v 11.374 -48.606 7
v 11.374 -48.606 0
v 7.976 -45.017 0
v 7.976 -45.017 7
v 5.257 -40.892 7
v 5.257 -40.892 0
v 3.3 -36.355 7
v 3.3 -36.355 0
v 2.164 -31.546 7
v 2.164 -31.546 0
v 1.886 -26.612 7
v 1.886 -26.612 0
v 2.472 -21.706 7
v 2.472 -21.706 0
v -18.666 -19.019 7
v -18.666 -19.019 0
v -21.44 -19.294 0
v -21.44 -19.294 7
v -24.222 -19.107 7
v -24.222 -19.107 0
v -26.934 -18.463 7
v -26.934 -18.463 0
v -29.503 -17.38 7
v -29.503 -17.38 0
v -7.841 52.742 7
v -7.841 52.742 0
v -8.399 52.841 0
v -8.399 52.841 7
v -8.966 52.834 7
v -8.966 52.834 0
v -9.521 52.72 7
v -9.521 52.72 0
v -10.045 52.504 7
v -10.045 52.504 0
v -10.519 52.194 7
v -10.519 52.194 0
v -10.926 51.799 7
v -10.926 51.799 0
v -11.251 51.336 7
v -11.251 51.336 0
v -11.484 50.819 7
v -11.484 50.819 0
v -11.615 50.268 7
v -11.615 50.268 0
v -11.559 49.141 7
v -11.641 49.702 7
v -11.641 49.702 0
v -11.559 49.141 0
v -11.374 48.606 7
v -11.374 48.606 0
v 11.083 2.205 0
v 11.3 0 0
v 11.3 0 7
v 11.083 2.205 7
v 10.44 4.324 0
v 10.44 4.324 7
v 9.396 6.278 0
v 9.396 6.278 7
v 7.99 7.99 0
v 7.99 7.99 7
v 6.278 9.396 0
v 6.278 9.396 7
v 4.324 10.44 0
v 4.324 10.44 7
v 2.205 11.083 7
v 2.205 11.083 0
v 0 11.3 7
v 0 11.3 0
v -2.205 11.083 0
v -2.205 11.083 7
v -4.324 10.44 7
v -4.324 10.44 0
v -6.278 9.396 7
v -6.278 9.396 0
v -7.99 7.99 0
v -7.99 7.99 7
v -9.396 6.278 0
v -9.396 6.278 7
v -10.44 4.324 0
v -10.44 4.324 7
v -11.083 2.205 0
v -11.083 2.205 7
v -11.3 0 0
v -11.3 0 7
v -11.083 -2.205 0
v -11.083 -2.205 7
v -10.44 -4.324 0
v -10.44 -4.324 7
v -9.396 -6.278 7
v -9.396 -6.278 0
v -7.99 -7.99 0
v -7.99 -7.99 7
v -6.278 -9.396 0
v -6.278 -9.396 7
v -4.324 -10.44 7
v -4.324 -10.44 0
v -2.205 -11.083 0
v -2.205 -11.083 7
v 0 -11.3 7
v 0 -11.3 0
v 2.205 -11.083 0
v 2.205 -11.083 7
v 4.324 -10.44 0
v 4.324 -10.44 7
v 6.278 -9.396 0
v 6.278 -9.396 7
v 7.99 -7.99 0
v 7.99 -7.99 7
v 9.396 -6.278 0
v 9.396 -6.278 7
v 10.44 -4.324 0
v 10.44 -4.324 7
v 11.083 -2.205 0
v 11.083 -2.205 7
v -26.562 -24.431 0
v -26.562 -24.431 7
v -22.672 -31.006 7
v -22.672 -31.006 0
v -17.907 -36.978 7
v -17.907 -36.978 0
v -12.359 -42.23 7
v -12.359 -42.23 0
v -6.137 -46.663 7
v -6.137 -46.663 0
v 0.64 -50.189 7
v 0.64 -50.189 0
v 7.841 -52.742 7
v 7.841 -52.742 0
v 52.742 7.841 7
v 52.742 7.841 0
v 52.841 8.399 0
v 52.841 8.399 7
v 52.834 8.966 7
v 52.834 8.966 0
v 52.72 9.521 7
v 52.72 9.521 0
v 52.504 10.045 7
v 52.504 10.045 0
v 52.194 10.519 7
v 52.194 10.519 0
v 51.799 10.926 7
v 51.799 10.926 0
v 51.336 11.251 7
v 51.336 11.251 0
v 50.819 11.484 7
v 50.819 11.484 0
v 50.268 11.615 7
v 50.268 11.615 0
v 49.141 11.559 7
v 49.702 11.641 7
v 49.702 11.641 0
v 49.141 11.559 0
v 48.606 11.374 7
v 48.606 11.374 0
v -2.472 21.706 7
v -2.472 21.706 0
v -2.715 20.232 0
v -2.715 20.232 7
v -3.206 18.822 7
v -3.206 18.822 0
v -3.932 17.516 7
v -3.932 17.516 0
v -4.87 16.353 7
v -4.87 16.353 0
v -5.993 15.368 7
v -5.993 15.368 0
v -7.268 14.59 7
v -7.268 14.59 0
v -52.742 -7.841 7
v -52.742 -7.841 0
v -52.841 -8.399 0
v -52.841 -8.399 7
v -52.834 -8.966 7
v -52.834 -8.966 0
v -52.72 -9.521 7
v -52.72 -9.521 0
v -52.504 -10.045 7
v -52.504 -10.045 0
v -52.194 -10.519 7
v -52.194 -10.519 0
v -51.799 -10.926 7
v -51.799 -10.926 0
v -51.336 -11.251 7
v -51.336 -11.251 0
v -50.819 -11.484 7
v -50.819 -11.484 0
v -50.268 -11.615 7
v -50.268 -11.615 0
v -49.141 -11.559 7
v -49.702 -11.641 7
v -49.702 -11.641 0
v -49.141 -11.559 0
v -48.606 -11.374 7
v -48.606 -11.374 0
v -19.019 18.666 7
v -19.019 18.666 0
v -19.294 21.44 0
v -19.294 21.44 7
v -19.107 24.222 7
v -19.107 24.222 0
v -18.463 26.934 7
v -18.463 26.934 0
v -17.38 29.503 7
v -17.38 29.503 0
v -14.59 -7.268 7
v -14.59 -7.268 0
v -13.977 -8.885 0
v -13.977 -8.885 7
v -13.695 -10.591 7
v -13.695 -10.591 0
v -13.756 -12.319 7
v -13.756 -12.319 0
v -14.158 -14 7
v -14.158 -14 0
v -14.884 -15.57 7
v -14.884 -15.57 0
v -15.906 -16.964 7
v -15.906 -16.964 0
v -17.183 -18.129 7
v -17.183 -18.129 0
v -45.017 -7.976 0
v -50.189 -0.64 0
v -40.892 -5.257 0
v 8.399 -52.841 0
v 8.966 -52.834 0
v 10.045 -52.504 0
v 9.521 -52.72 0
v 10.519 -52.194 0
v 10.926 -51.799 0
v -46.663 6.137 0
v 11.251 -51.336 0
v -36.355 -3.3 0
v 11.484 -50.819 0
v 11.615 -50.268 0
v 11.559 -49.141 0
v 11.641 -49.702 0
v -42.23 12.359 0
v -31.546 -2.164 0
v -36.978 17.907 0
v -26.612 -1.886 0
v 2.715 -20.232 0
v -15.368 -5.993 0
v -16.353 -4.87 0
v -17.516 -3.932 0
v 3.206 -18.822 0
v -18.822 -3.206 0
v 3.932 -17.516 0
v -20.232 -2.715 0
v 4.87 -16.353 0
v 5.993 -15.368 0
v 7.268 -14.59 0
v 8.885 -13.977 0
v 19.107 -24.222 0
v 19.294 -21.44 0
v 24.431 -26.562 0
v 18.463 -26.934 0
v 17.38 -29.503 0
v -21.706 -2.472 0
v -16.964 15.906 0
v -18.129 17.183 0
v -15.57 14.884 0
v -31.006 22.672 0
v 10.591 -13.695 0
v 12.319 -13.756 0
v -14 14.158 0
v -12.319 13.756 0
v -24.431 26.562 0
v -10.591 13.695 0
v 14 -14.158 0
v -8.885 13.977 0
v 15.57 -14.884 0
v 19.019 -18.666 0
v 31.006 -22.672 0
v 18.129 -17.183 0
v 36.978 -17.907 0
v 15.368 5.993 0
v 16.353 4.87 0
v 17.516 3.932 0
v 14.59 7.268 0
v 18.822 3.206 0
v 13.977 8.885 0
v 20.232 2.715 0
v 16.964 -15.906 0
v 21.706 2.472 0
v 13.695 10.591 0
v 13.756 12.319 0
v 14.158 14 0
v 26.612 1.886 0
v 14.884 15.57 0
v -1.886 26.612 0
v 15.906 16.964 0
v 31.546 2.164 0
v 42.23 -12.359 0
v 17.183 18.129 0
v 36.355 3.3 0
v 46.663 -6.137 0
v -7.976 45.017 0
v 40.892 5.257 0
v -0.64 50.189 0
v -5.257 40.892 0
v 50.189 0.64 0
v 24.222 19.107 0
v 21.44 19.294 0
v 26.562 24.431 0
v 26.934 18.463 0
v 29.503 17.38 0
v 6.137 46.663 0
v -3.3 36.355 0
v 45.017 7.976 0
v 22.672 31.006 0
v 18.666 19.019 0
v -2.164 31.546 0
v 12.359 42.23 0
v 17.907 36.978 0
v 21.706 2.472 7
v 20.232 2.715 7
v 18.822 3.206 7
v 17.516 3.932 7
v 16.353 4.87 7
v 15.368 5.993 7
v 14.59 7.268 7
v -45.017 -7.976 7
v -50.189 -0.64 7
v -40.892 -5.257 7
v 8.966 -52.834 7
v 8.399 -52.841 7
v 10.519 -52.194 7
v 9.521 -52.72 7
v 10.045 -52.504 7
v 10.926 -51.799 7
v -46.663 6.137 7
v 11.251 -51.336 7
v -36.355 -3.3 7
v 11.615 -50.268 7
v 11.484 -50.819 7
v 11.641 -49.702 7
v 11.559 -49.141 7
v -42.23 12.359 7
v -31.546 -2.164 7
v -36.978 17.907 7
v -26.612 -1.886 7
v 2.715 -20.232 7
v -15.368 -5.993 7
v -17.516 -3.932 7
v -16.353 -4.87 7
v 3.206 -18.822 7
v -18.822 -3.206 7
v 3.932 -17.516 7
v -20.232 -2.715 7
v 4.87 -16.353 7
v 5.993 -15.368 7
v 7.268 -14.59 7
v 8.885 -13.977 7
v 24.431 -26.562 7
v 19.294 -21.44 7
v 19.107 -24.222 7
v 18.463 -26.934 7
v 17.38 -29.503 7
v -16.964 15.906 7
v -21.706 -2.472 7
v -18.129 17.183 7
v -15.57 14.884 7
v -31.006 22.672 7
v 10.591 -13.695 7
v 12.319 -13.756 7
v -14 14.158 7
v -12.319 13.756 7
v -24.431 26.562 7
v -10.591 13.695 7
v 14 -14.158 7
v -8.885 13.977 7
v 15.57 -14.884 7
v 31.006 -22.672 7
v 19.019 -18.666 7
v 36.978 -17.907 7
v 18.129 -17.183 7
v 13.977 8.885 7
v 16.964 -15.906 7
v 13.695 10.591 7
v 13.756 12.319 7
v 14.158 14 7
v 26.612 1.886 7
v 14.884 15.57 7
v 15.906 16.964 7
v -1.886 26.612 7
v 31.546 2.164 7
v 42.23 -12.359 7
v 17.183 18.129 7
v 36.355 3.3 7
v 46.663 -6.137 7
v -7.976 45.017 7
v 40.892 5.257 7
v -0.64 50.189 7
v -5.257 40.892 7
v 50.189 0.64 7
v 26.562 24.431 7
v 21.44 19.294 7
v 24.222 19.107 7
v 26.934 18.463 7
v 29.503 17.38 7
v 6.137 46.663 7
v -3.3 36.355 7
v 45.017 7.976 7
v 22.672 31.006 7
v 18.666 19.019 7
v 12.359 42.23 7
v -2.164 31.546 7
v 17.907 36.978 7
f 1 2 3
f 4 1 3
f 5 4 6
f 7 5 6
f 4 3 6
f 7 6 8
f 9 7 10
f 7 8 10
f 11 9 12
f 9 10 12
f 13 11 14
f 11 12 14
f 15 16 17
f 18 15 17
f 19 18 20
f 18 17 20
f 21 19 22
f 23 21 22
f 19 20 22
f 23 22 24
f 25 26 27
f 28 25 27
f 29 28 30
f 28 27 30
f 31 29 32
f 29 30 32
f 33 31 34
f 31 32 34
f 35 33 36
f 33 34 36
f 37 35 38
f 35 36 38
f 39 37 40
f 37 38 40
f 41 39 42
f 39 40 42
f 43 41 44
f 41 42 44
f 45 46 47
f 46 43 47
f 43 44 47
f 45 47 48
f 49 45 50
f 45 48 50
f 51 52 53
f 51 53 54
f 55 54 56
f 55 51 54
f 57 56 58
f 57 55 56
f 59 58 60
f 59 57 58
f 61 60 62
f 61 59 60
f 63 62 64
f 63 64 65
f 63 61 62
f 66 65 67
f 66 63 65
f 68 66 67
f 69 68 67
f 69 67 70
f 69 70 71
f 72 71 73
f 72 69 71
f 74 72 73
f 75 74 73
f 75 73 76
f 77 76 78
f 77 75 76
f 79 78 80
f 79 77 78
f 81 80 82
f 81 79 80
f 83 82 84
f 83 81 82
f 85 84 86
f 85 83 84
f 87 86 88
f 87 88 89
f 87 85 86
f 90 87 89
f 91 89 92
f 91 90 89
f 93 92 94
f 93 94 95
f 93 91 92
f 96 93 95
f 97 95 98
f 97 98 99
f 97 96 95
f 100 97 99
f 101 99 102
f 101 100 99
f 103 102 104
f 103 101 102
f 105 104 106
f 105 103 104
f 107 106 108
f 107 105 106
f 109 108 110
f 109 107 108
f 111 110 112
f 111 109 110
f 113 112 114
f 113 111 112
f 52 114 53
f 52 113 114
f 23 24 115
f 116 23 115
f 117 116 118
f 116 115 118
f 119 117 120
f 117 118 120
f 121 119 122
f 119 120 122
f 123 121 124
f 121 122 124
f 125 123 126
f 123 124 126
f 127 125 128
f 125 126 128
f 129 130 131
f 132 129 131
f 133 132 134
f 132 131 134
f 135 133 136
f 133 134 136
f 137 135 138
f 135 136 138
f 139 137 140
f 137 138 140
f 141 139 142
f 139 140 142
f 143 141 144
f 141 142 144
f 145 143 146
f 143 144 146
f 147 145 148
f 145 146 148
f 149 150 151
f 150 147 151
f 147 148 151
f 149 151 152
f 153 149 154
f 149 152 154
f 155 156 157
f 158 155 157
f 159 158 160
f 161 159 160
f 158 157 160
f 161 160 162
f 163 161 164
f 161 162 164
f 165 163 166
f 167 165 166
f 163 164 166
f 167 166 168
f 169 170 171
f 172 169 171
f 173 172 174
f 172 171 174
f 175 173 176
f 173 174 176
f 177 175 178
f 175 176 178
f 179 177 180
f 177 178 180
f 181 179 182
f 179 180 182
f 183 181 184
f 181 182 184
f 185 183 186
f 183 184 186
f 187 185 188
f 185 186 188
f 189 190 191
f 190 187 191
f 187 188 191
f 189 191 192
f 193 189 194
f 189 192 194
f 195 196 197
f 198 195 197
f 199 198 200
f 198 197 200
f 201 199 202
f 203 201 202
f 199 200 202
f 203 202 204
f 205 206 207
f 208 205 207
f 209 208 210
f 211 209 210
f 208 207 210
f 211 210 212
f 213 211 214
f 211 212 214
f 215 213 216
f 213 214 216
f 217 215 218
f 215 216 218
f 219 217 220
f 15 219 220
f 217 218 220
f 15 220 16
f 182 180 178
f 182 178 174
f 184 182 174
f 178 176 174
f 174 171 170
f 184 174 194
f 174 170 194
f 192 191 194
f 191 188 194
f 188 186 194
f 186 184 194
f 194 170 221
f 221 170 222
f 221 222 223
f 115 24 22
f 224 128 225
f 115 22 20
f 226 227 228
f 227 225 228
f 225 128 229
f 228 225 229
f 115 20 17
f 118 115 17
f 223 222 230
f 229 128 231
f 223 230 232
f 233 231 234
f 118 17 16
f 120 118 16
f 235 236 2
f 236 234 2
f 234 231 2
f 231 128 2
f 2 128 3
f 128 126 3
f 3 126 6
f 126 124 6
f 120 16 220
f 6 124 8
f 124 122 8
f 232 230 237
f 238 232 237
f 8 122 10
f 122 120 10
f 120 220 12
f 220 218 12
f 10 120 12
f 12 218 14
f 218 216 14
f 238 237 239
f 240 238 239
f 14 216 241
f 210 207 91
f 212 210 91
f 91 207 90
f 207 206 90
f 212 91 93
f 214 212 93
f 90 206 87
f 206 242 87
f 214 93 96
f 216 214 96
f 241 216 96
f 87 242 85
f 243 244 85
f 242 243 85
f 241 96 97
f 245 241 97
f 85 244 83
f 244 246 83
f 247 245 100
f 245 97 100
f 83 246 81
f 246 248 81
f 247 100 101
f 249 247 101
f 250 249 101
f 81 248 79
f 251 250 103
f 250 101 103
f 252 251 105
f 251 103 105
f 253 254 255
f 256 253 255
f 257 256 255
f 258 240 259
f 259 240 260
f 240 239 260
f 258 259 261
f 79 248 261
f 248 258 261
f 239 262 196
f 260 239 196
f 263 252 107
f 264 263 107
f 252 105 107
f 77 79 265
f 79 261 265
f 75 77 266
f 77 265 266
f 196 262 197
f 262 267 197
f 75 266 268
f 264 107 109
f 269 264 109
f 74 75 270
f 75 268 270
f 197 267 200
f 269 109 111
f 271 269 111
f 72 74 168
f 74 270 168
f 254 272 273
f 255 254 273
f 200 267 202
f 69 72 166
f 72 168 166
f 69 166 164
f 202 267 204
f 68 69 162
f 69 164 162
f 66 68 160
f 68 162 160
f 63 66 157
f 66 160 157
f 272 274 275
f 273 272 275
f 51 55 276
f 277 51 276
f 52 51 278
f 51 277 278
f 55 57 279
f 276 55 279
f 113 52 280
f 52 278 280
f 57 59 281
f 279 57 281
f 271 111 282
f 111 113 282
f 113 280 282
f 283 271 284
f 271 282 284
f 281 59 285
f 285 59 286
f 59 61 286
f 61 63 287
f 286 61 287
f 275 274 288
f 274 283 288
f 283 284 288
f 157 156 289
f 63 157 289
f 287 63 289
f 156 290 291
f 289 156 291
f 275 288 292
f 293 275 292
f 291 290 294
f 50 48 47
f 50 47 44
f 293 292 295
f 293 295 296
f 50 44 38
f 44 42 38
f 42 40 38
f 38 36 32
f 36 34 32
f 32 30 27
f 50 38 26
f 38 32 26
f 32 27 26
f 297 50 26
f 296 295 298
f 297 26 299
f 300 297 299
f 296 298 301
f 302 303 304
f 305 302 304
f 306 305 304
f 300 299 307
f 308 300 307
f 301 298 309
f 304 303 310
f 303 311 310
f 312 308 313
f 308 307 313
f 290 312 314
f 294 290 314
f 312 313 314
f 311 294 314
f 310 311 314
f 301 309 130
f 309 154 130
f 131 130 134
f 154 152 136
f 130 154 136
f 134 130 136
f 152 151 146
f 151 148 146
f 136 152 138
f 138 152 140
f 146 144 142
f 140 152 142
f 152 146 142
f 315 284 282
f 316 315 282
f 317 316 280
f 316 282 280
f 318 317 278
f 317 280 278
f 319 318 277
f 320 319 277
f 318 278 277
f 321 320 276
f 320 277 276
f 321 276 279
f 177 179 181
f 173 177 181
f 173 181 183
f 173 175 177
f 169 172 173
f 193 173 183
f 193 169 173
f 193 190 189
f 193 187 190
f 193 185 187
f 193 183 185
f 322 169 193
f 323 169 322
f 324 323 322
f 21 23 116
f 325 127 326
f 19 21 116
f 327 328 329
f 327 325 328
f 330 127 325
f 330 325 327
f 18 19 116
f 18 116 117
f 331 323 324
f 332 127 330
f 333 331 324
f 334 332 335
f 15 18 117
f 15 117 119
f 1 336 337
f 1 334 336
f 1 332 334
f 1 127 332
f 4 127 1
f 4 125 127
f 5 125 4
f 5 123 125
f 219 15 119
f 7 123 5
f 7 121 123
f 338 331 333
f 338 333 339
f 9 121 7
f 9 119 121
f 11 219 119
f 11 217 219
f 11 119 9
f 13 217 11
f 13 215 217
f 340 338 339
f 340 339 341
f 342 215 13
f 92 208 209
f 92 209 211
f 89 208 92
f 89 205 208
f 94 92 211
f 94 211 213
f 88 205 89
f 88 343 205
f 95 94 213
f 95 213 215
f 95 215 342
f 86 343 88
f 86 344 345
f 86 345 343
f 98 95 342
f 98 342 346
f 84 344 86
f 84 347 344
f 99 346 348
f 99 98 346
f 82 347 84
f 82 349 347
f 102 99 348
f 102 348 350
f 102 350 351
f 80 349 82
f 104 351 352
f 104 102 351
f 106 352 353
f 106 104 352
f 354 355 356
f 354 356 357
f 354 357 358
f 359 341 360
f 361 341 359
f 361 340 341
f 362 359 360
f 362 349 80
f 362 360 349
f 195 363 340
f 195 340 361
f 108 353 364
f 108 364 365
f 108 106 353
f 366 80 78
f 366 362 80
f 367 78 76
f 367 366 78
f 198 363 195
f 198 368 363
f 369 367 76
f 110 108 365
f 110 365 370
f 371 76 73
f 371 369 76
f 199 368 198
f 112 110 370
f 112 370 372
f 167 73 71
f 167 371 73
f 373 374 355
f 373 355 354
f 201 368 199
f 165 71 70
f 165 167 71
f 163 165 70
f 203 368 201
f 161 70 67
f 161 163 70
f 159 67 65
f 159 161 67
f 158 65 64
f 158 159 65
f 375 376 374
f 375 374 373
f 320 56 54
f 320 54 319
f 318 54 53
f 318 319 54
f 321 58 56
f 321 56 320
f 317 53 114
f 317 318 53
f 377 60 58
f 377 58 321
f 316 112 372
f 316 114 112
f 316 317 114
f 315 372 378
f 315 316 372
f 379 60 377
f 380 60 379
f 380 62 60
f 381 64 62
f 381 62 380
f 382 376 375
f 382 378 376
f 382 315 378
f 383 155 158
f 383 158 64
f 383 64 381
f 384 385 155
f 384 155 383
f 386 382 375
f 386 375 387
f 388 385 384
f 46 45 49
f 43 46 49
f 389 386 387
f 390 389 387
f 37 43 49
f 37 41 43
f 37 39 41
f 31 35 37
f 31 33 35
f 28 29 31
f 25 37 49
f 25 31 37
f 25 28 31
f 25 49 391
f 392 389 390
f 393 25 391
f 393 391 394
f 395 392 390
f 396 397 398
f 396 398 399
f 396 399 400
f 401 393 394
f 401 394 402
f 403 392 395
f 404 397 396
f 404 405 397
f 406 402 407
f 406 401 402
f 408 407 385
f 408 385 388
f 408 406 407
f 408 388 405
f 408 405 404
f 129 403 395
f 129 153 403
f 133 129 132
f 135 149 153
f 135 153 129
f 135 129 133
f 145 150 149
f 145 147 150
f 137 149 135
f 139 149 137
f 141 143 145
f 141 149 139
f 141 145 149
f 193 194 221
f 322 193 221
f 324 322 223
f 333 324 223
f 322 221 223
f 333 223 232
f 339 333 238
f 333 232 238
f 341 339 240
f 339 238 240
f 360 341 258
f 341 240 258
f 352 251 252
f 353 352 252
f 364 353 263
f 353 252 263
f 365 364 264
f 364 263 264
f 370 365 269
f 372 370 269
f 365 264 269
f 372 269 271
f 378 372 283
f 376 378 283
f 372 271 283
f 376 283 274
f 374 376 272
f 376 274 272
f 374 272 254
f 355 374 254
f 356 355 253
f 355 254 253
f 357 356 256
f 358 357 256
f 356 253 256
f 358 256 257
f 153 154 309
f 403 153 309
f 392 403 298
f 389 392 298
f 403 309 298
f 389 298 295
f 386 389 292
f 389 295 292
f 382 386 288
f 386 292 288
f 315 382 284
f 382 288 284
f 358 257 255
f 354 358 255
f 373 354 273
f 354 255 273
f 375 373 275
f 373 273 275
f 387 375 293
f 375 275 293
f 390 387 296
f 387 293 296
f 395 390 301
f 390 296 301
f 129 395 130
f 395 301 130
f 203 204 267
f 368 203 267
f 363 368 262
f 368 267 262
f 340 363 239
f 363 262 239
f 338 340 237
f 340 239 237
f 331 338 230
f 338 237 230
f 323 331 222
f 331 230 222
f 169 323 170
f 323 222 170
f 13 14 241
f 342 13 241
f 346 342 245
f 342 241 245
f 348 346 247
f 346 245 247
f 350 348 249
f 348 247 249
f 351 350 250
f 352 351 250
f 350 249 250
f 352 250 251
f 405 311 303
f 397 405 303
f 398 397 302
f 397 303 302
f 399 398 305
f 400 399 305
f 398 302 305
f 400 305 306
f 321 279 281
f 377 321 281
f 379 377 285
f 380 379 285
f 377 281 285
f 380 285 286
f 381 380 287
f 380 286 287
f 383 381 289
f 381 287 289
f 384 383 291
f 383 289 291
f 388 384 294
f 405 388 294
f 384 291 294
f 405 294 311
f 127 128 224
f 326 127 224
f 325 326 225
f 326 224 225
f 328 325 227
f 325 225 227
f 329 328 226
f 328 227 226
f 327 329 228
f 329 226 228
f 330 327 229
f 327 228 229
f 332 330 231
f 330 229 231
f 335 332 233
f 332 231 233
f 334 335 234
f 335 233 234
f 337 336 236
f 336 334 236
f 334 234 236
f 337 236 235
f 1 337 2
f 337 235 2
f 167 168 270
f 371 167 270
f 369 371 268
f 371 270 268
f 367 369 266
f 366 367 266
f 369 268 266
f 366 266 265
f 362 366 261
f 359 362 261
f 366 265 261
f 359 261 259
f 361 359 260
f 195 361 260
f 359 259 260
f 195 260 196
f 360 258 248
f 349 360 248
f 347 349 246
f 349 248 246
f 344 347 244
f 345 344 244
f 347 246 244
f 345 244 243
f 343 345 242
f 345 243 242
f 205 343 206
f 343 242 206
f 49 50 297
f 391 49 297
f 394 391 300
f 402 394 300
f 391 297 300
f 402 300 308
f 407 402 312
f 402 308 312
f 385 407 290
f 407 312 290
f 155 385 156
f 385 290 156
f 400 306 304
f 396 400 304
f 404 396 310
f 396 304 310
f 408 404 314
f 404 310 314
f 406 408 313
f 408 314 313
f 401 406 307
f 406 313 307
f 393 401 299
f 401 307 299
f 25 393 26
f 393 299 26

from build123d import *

# Parameters (mm, degrees)
F0_R        = 11.3
F1_DEPTH    = 7
F2_T1_DEPTH = 55.4992808982


# Not quite as in the source:
# - a fillet or chamfer that OpenCascade refuses, or shapes differently, is made with other operations: its cross-section is extruded or revolved along the edge and cut away or added
# - a feature names something its author has since deleted; it is built from what else it names


with BuildPart() as f1:
    # F0 (on Top) → F1 (new body)
    with BuildSketch(Plane.XY):
        with BuildLine():
            ThreePointArc((-19.0188516855, 18.6660698042), (-19.106601179, 24.2218879742), (-17.3798078978, 29.5032704141))
            ThreePointArc((-17.3798078978, 29.5032704141), (-42.8794362662, 11.5553714496), (-54.5032704141, -17.3798078978))
            ThreePointArc((-54.5032704141, -17.3798078978), (-51.6509498036, -14.2819027835), (-48.6055213036, -11.3736190606))
            ThreePointArc((-48.6055213036, -11.3736190606), (-36.3546417903, -3.2999675651), (-21.7060170396, -2.4719034169))
            ThreePointArc((-21.7060170396, -2.4719034169), (-17.5157178103, -3.9318400494), (-14.5899419176, -7.2679842351))
            ThreePointArc((-14.5899419176, -7.2679842351), (-15.4558877949, 5.1774059597), (-7.2679841768, 14.5899419466))
            ThreePointArc((-7.2679841768, 14.5899419466), (-14.000366861, 14.1575501664), (-19.0188516855, 18.6660698042))
        make_face()
        with BuildLine():
            ThreePointArc((-2.4719034169, 21.7060170396), (-3.9318400312, 17.5157178373), (-7.2679841768, 14.5899419466))
            ThreePointArc((-7.2679841768, 14.5899419466), (5.177405829, 15.4558878387), (14.5899417947, 7.2679844819))
            ThreePointArc((14.5899417947, 7.2679844819), (14.1575502222, 14.000367022), (18.6660698042, 19.0188516855))
            ThreePointArc((18.6660698042, 19.0188516855), (24.2218879742, 19.106601179), (29.5032704141, 17.3798078978))
            ThreePointArc((29.5032704141, 17.3798078978), (11.5553714496, 42.8794362662), (-17.3798078978, 54.5032704141))
            ThreePointArc((-17.3798078978, 54.5032704141), (-14.2819027835, 51.6509498036), (-11.3736190606, 48.6055213036))
            ThreePointArc((-11.3736190606, 48.6055213036), (-3.2999675651, 36.3546417903), (-2.4719034169, 21.7060170396))
        make_face()
        with BuildLine():
            ThreePointArc((14.5899417947, 7.2679844819), (5.177405829, 15.4558878387), (-7.2679841768, 14.5899419466))
            ThreePointArc((-7.2679841768, 14.5899419466), (-15.4558877949, 5.1774059597), (-14.5899419176, -7.2679842351))
            ThreePointArc((-14.5899419176, -7.2679842351), (-5.1774060707, -15.4558877577), (7.2679839673, -14.589942051))
            ThreePointArc((7.2679839673, -14.589942051), (13.8592593357, -8.5796812684), (16.3, 0))
            ThreePointArc((16.3, 0), (15.8667269979, 3.733225733), (14.5899417947, 7.2679844819))
        make_face()
        Circle(F0_R, mode=Mode.SUBTRACT)
        with BuildLine():
            ThreePointArc((7.2679839673, -14.589942051), (-5.1774060707, -15.4558877577), (-14.5899419176, -7.2679842351))
            ThreePointArc((-14.5899419176, -7.2679842351), (-14.157550177, -14.0003668918), (-18.6660698042, -19.0188516855))
            ThreePointArc((-18.6660698042, -19.0188516855), (-24.2218879742, -19.106601179), (-29.5032704141, -17.3798078978))
            ThreePointArc((-29.5032704141, -17.3798078978), (-11.5553714496, -42.8794362662), (17.3798078978, -54.5032704141))
            ThreePointArc((17.3798078978, -54.5032704141), (14.2819027835, -51.6509498036), (11.3736190606, -48.6055213036))
            ThreePointArc((11.3736190606, -48.6055213036), (3.2999675651, -36.3546417903), (2.4719034169, -21.7060170396))
            ThreePointArc((2.4719034169, -21.7060170396), (3.9318399658, -17.5157179344), (7.2679839673, -14.589942051))
        make_face()
        with BuildLine():
            ThreePointArc((21.7060170396, 2.4719034169), (17.515717696, 3.9318401265), (14.5899417947, 7.2679844819))
            ThreePointArc((14.5899417947, 7.2679844819), (15.8667269979, 3.733225733), (16.3, 0))
            ThreePointArc((16.3, 0), (13.8592593357, -8.5796812684), (7.2679839673, -14.589942051))
            ThreePointArc((7.2679839673, -14.589942051), (14.0003667504, -14.157550128), (19.0188516855, -18.6660698042))
            ThreePointArc((19.0188516855, -18.6660698042), (19.106601179, -24.2218879742), (17.3798078978, -29.5032704141))
            ThreePointArc((17.3798078978, -29.5032704141), (42.8794362662, -11.5553714496), (54.5032704141, 17.3798078978))
            ThreePointArc((54.5032704141, 17.3798078978), (51.6509498036, 14.2819027835), (48.6055213036, 11.3736190606))
            ThreePointArc((48.6055213036, 11.3736190606), (36.3546417903, 3.2999675651), (21.7060170396, 2.4719034169))
        make_face()
    extrude(amount=F1_DEPTH)

    # F2: fillet of radius 3 on 4 edges, made by hand

    # F2_s2 → F2_t1 (cut)
    with BuildSketch(Plane.XY.offset(-24.2496404491)):
        with BuildLine():
            ThreePointArc((-52.7416075724, -7.8412674467), (-51.7993975119, -10.9256989731), (-48.6055213036, -11.3736190606))
            ThreePointArc((-48.6055213036, -11.3736190606), (-51.6509498036, -14.2819027835), (-54.5032704141, -17.3798078978))
            ThreePointArc((-54.5032704141, -17.3798078978), (-53.8333652751, -12.5715819227), (-52.7416075724, -7.8412674467))
        make_face()
        with BuildLine():
            ThreePointArc((7.8412674467, -52.7416075724), (10.9256989731, -51.7993975119), (11.3736190606, -48.6055213036))
            ThreePointArc((11.3736190606, -48.6055213036), (14.2819027835, -51.6509498036), (17.3798078978, -54.5032704141))
            ThreePointArc((17.3798078978, -54.5032704141), (12.5715819227, -53.8333652751), (7.8412674467, -52.7416075724))
        make_face()
        with BuildLine():
            ThreePointArc((52.7416075724, 7.8412674467), (51.7993975119, 10.9256989731), (48.6055213036, 11.3736190606))
            ThreePointArc((48.6055213036, 11.3736190606), (51.6509498036, 14.2819027835), (54.5032704141, 17.3798078978))
            ThreePointArc((54.5032704141, 17.3798078978), (53.8333652751, 12.5715819227), (52.7416075724, 7.8412674467))
        make_face()
        with BuildLine():
            ThreePointArc((-7.8412674467, 52.7416075724), (-10.9256989731, 51.7993975119), (-11.3736190606, 48.6055213036))
            ThreePointArc((-11.3736190606, 48.6055213036), (-14.2819027835, 51.6509498036), (-17.3798078978, 54.5032704141))
            ThreePointArc((-17.3798078978, 54.5032704141), (-12.5715819227, 53.8333652751), (-7.8412674467, 52.7416075724))
        make_face()
    extrude(amount=F2_T1_DEPTH, mode=Mode.SUBTRACT)


solid = f1.part
